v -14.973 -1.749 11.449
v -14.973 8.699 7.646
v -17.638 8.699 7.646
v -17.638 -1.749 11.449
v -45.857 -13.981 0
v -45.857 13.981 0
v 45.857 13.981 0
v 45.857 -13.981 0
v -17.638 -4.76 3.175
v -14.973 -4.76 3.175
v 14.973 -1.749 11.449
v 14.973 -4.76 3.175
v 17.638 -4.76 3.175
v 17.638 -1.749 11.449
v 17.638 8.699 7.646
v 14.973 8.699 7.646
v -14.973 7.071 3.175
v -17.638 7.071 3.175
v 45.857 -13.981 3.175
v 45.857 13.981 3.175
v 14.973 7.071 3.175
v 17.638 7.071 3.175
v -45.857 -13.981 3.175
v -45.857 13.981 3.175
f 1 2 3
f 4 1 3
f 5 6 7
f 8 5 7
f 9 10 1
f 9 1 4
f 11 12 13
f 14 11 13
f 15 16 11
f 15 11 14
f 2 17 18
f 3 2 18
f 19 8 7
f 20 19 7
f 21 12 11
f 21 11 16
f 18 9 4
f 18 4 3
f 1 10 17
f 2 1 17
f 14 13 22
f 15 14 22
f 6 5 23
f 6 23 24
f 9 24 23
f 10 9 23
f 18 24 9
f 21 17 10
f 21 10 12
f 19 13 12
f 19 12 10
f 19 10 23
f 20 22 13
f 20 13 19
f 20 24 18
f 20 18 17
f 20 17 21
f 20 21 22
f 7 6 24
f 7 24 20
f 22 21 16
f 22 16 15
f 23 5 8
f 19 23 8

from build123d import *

# Parameters (mm, degrees)
F0_W     = 91.7135253549
F0_H     = 27.9620755464
F1_DEPTH = 3.175
F4_W     = 2.665694803
F4_H     = 11.1176939681
F5_DEPTH = 10.16
F7_W     = 36.2722687423
F7_H     = 13.592146337
F8_DEPTH = 68.072


with BuildPart() as f1:
    # F0 (on Top) → F1 (new body)
    with BuildSketch(Plane.XY):
        Rectangle(F0_W, F0_H)
    extrude(amount=F1_DEPTH)

    # F4 (on line) → F5 (join)
    with BuildSketch(Plane(origin=(0, 0, 0), x_dir=(1, 0, 0), z_dir=(0, 0.3420201433, 0.9396926208))):
        with Locations((16.3055844605, 0)):
            Rectangle(F4_W, F4_H)
    extrude(amount=F5_DEPTH)

    # F6: F1 across plane


with BuildPart() as f1_1:
    add(f1.part)
    add(f1.part.mirror(Plane.YZ))

    # F7 (on Right) → F8 (cut, symmetric)
    with BuildSketch(Plane.YZ):
        with Locations((0.2234503627, -6.7960731685)):
            Rectangle(F7_W, F7_H)
    extrude(amount=F8_DEPTH, both=True, mode=Mode.SUBTRACT)


solid = f1_1.part
